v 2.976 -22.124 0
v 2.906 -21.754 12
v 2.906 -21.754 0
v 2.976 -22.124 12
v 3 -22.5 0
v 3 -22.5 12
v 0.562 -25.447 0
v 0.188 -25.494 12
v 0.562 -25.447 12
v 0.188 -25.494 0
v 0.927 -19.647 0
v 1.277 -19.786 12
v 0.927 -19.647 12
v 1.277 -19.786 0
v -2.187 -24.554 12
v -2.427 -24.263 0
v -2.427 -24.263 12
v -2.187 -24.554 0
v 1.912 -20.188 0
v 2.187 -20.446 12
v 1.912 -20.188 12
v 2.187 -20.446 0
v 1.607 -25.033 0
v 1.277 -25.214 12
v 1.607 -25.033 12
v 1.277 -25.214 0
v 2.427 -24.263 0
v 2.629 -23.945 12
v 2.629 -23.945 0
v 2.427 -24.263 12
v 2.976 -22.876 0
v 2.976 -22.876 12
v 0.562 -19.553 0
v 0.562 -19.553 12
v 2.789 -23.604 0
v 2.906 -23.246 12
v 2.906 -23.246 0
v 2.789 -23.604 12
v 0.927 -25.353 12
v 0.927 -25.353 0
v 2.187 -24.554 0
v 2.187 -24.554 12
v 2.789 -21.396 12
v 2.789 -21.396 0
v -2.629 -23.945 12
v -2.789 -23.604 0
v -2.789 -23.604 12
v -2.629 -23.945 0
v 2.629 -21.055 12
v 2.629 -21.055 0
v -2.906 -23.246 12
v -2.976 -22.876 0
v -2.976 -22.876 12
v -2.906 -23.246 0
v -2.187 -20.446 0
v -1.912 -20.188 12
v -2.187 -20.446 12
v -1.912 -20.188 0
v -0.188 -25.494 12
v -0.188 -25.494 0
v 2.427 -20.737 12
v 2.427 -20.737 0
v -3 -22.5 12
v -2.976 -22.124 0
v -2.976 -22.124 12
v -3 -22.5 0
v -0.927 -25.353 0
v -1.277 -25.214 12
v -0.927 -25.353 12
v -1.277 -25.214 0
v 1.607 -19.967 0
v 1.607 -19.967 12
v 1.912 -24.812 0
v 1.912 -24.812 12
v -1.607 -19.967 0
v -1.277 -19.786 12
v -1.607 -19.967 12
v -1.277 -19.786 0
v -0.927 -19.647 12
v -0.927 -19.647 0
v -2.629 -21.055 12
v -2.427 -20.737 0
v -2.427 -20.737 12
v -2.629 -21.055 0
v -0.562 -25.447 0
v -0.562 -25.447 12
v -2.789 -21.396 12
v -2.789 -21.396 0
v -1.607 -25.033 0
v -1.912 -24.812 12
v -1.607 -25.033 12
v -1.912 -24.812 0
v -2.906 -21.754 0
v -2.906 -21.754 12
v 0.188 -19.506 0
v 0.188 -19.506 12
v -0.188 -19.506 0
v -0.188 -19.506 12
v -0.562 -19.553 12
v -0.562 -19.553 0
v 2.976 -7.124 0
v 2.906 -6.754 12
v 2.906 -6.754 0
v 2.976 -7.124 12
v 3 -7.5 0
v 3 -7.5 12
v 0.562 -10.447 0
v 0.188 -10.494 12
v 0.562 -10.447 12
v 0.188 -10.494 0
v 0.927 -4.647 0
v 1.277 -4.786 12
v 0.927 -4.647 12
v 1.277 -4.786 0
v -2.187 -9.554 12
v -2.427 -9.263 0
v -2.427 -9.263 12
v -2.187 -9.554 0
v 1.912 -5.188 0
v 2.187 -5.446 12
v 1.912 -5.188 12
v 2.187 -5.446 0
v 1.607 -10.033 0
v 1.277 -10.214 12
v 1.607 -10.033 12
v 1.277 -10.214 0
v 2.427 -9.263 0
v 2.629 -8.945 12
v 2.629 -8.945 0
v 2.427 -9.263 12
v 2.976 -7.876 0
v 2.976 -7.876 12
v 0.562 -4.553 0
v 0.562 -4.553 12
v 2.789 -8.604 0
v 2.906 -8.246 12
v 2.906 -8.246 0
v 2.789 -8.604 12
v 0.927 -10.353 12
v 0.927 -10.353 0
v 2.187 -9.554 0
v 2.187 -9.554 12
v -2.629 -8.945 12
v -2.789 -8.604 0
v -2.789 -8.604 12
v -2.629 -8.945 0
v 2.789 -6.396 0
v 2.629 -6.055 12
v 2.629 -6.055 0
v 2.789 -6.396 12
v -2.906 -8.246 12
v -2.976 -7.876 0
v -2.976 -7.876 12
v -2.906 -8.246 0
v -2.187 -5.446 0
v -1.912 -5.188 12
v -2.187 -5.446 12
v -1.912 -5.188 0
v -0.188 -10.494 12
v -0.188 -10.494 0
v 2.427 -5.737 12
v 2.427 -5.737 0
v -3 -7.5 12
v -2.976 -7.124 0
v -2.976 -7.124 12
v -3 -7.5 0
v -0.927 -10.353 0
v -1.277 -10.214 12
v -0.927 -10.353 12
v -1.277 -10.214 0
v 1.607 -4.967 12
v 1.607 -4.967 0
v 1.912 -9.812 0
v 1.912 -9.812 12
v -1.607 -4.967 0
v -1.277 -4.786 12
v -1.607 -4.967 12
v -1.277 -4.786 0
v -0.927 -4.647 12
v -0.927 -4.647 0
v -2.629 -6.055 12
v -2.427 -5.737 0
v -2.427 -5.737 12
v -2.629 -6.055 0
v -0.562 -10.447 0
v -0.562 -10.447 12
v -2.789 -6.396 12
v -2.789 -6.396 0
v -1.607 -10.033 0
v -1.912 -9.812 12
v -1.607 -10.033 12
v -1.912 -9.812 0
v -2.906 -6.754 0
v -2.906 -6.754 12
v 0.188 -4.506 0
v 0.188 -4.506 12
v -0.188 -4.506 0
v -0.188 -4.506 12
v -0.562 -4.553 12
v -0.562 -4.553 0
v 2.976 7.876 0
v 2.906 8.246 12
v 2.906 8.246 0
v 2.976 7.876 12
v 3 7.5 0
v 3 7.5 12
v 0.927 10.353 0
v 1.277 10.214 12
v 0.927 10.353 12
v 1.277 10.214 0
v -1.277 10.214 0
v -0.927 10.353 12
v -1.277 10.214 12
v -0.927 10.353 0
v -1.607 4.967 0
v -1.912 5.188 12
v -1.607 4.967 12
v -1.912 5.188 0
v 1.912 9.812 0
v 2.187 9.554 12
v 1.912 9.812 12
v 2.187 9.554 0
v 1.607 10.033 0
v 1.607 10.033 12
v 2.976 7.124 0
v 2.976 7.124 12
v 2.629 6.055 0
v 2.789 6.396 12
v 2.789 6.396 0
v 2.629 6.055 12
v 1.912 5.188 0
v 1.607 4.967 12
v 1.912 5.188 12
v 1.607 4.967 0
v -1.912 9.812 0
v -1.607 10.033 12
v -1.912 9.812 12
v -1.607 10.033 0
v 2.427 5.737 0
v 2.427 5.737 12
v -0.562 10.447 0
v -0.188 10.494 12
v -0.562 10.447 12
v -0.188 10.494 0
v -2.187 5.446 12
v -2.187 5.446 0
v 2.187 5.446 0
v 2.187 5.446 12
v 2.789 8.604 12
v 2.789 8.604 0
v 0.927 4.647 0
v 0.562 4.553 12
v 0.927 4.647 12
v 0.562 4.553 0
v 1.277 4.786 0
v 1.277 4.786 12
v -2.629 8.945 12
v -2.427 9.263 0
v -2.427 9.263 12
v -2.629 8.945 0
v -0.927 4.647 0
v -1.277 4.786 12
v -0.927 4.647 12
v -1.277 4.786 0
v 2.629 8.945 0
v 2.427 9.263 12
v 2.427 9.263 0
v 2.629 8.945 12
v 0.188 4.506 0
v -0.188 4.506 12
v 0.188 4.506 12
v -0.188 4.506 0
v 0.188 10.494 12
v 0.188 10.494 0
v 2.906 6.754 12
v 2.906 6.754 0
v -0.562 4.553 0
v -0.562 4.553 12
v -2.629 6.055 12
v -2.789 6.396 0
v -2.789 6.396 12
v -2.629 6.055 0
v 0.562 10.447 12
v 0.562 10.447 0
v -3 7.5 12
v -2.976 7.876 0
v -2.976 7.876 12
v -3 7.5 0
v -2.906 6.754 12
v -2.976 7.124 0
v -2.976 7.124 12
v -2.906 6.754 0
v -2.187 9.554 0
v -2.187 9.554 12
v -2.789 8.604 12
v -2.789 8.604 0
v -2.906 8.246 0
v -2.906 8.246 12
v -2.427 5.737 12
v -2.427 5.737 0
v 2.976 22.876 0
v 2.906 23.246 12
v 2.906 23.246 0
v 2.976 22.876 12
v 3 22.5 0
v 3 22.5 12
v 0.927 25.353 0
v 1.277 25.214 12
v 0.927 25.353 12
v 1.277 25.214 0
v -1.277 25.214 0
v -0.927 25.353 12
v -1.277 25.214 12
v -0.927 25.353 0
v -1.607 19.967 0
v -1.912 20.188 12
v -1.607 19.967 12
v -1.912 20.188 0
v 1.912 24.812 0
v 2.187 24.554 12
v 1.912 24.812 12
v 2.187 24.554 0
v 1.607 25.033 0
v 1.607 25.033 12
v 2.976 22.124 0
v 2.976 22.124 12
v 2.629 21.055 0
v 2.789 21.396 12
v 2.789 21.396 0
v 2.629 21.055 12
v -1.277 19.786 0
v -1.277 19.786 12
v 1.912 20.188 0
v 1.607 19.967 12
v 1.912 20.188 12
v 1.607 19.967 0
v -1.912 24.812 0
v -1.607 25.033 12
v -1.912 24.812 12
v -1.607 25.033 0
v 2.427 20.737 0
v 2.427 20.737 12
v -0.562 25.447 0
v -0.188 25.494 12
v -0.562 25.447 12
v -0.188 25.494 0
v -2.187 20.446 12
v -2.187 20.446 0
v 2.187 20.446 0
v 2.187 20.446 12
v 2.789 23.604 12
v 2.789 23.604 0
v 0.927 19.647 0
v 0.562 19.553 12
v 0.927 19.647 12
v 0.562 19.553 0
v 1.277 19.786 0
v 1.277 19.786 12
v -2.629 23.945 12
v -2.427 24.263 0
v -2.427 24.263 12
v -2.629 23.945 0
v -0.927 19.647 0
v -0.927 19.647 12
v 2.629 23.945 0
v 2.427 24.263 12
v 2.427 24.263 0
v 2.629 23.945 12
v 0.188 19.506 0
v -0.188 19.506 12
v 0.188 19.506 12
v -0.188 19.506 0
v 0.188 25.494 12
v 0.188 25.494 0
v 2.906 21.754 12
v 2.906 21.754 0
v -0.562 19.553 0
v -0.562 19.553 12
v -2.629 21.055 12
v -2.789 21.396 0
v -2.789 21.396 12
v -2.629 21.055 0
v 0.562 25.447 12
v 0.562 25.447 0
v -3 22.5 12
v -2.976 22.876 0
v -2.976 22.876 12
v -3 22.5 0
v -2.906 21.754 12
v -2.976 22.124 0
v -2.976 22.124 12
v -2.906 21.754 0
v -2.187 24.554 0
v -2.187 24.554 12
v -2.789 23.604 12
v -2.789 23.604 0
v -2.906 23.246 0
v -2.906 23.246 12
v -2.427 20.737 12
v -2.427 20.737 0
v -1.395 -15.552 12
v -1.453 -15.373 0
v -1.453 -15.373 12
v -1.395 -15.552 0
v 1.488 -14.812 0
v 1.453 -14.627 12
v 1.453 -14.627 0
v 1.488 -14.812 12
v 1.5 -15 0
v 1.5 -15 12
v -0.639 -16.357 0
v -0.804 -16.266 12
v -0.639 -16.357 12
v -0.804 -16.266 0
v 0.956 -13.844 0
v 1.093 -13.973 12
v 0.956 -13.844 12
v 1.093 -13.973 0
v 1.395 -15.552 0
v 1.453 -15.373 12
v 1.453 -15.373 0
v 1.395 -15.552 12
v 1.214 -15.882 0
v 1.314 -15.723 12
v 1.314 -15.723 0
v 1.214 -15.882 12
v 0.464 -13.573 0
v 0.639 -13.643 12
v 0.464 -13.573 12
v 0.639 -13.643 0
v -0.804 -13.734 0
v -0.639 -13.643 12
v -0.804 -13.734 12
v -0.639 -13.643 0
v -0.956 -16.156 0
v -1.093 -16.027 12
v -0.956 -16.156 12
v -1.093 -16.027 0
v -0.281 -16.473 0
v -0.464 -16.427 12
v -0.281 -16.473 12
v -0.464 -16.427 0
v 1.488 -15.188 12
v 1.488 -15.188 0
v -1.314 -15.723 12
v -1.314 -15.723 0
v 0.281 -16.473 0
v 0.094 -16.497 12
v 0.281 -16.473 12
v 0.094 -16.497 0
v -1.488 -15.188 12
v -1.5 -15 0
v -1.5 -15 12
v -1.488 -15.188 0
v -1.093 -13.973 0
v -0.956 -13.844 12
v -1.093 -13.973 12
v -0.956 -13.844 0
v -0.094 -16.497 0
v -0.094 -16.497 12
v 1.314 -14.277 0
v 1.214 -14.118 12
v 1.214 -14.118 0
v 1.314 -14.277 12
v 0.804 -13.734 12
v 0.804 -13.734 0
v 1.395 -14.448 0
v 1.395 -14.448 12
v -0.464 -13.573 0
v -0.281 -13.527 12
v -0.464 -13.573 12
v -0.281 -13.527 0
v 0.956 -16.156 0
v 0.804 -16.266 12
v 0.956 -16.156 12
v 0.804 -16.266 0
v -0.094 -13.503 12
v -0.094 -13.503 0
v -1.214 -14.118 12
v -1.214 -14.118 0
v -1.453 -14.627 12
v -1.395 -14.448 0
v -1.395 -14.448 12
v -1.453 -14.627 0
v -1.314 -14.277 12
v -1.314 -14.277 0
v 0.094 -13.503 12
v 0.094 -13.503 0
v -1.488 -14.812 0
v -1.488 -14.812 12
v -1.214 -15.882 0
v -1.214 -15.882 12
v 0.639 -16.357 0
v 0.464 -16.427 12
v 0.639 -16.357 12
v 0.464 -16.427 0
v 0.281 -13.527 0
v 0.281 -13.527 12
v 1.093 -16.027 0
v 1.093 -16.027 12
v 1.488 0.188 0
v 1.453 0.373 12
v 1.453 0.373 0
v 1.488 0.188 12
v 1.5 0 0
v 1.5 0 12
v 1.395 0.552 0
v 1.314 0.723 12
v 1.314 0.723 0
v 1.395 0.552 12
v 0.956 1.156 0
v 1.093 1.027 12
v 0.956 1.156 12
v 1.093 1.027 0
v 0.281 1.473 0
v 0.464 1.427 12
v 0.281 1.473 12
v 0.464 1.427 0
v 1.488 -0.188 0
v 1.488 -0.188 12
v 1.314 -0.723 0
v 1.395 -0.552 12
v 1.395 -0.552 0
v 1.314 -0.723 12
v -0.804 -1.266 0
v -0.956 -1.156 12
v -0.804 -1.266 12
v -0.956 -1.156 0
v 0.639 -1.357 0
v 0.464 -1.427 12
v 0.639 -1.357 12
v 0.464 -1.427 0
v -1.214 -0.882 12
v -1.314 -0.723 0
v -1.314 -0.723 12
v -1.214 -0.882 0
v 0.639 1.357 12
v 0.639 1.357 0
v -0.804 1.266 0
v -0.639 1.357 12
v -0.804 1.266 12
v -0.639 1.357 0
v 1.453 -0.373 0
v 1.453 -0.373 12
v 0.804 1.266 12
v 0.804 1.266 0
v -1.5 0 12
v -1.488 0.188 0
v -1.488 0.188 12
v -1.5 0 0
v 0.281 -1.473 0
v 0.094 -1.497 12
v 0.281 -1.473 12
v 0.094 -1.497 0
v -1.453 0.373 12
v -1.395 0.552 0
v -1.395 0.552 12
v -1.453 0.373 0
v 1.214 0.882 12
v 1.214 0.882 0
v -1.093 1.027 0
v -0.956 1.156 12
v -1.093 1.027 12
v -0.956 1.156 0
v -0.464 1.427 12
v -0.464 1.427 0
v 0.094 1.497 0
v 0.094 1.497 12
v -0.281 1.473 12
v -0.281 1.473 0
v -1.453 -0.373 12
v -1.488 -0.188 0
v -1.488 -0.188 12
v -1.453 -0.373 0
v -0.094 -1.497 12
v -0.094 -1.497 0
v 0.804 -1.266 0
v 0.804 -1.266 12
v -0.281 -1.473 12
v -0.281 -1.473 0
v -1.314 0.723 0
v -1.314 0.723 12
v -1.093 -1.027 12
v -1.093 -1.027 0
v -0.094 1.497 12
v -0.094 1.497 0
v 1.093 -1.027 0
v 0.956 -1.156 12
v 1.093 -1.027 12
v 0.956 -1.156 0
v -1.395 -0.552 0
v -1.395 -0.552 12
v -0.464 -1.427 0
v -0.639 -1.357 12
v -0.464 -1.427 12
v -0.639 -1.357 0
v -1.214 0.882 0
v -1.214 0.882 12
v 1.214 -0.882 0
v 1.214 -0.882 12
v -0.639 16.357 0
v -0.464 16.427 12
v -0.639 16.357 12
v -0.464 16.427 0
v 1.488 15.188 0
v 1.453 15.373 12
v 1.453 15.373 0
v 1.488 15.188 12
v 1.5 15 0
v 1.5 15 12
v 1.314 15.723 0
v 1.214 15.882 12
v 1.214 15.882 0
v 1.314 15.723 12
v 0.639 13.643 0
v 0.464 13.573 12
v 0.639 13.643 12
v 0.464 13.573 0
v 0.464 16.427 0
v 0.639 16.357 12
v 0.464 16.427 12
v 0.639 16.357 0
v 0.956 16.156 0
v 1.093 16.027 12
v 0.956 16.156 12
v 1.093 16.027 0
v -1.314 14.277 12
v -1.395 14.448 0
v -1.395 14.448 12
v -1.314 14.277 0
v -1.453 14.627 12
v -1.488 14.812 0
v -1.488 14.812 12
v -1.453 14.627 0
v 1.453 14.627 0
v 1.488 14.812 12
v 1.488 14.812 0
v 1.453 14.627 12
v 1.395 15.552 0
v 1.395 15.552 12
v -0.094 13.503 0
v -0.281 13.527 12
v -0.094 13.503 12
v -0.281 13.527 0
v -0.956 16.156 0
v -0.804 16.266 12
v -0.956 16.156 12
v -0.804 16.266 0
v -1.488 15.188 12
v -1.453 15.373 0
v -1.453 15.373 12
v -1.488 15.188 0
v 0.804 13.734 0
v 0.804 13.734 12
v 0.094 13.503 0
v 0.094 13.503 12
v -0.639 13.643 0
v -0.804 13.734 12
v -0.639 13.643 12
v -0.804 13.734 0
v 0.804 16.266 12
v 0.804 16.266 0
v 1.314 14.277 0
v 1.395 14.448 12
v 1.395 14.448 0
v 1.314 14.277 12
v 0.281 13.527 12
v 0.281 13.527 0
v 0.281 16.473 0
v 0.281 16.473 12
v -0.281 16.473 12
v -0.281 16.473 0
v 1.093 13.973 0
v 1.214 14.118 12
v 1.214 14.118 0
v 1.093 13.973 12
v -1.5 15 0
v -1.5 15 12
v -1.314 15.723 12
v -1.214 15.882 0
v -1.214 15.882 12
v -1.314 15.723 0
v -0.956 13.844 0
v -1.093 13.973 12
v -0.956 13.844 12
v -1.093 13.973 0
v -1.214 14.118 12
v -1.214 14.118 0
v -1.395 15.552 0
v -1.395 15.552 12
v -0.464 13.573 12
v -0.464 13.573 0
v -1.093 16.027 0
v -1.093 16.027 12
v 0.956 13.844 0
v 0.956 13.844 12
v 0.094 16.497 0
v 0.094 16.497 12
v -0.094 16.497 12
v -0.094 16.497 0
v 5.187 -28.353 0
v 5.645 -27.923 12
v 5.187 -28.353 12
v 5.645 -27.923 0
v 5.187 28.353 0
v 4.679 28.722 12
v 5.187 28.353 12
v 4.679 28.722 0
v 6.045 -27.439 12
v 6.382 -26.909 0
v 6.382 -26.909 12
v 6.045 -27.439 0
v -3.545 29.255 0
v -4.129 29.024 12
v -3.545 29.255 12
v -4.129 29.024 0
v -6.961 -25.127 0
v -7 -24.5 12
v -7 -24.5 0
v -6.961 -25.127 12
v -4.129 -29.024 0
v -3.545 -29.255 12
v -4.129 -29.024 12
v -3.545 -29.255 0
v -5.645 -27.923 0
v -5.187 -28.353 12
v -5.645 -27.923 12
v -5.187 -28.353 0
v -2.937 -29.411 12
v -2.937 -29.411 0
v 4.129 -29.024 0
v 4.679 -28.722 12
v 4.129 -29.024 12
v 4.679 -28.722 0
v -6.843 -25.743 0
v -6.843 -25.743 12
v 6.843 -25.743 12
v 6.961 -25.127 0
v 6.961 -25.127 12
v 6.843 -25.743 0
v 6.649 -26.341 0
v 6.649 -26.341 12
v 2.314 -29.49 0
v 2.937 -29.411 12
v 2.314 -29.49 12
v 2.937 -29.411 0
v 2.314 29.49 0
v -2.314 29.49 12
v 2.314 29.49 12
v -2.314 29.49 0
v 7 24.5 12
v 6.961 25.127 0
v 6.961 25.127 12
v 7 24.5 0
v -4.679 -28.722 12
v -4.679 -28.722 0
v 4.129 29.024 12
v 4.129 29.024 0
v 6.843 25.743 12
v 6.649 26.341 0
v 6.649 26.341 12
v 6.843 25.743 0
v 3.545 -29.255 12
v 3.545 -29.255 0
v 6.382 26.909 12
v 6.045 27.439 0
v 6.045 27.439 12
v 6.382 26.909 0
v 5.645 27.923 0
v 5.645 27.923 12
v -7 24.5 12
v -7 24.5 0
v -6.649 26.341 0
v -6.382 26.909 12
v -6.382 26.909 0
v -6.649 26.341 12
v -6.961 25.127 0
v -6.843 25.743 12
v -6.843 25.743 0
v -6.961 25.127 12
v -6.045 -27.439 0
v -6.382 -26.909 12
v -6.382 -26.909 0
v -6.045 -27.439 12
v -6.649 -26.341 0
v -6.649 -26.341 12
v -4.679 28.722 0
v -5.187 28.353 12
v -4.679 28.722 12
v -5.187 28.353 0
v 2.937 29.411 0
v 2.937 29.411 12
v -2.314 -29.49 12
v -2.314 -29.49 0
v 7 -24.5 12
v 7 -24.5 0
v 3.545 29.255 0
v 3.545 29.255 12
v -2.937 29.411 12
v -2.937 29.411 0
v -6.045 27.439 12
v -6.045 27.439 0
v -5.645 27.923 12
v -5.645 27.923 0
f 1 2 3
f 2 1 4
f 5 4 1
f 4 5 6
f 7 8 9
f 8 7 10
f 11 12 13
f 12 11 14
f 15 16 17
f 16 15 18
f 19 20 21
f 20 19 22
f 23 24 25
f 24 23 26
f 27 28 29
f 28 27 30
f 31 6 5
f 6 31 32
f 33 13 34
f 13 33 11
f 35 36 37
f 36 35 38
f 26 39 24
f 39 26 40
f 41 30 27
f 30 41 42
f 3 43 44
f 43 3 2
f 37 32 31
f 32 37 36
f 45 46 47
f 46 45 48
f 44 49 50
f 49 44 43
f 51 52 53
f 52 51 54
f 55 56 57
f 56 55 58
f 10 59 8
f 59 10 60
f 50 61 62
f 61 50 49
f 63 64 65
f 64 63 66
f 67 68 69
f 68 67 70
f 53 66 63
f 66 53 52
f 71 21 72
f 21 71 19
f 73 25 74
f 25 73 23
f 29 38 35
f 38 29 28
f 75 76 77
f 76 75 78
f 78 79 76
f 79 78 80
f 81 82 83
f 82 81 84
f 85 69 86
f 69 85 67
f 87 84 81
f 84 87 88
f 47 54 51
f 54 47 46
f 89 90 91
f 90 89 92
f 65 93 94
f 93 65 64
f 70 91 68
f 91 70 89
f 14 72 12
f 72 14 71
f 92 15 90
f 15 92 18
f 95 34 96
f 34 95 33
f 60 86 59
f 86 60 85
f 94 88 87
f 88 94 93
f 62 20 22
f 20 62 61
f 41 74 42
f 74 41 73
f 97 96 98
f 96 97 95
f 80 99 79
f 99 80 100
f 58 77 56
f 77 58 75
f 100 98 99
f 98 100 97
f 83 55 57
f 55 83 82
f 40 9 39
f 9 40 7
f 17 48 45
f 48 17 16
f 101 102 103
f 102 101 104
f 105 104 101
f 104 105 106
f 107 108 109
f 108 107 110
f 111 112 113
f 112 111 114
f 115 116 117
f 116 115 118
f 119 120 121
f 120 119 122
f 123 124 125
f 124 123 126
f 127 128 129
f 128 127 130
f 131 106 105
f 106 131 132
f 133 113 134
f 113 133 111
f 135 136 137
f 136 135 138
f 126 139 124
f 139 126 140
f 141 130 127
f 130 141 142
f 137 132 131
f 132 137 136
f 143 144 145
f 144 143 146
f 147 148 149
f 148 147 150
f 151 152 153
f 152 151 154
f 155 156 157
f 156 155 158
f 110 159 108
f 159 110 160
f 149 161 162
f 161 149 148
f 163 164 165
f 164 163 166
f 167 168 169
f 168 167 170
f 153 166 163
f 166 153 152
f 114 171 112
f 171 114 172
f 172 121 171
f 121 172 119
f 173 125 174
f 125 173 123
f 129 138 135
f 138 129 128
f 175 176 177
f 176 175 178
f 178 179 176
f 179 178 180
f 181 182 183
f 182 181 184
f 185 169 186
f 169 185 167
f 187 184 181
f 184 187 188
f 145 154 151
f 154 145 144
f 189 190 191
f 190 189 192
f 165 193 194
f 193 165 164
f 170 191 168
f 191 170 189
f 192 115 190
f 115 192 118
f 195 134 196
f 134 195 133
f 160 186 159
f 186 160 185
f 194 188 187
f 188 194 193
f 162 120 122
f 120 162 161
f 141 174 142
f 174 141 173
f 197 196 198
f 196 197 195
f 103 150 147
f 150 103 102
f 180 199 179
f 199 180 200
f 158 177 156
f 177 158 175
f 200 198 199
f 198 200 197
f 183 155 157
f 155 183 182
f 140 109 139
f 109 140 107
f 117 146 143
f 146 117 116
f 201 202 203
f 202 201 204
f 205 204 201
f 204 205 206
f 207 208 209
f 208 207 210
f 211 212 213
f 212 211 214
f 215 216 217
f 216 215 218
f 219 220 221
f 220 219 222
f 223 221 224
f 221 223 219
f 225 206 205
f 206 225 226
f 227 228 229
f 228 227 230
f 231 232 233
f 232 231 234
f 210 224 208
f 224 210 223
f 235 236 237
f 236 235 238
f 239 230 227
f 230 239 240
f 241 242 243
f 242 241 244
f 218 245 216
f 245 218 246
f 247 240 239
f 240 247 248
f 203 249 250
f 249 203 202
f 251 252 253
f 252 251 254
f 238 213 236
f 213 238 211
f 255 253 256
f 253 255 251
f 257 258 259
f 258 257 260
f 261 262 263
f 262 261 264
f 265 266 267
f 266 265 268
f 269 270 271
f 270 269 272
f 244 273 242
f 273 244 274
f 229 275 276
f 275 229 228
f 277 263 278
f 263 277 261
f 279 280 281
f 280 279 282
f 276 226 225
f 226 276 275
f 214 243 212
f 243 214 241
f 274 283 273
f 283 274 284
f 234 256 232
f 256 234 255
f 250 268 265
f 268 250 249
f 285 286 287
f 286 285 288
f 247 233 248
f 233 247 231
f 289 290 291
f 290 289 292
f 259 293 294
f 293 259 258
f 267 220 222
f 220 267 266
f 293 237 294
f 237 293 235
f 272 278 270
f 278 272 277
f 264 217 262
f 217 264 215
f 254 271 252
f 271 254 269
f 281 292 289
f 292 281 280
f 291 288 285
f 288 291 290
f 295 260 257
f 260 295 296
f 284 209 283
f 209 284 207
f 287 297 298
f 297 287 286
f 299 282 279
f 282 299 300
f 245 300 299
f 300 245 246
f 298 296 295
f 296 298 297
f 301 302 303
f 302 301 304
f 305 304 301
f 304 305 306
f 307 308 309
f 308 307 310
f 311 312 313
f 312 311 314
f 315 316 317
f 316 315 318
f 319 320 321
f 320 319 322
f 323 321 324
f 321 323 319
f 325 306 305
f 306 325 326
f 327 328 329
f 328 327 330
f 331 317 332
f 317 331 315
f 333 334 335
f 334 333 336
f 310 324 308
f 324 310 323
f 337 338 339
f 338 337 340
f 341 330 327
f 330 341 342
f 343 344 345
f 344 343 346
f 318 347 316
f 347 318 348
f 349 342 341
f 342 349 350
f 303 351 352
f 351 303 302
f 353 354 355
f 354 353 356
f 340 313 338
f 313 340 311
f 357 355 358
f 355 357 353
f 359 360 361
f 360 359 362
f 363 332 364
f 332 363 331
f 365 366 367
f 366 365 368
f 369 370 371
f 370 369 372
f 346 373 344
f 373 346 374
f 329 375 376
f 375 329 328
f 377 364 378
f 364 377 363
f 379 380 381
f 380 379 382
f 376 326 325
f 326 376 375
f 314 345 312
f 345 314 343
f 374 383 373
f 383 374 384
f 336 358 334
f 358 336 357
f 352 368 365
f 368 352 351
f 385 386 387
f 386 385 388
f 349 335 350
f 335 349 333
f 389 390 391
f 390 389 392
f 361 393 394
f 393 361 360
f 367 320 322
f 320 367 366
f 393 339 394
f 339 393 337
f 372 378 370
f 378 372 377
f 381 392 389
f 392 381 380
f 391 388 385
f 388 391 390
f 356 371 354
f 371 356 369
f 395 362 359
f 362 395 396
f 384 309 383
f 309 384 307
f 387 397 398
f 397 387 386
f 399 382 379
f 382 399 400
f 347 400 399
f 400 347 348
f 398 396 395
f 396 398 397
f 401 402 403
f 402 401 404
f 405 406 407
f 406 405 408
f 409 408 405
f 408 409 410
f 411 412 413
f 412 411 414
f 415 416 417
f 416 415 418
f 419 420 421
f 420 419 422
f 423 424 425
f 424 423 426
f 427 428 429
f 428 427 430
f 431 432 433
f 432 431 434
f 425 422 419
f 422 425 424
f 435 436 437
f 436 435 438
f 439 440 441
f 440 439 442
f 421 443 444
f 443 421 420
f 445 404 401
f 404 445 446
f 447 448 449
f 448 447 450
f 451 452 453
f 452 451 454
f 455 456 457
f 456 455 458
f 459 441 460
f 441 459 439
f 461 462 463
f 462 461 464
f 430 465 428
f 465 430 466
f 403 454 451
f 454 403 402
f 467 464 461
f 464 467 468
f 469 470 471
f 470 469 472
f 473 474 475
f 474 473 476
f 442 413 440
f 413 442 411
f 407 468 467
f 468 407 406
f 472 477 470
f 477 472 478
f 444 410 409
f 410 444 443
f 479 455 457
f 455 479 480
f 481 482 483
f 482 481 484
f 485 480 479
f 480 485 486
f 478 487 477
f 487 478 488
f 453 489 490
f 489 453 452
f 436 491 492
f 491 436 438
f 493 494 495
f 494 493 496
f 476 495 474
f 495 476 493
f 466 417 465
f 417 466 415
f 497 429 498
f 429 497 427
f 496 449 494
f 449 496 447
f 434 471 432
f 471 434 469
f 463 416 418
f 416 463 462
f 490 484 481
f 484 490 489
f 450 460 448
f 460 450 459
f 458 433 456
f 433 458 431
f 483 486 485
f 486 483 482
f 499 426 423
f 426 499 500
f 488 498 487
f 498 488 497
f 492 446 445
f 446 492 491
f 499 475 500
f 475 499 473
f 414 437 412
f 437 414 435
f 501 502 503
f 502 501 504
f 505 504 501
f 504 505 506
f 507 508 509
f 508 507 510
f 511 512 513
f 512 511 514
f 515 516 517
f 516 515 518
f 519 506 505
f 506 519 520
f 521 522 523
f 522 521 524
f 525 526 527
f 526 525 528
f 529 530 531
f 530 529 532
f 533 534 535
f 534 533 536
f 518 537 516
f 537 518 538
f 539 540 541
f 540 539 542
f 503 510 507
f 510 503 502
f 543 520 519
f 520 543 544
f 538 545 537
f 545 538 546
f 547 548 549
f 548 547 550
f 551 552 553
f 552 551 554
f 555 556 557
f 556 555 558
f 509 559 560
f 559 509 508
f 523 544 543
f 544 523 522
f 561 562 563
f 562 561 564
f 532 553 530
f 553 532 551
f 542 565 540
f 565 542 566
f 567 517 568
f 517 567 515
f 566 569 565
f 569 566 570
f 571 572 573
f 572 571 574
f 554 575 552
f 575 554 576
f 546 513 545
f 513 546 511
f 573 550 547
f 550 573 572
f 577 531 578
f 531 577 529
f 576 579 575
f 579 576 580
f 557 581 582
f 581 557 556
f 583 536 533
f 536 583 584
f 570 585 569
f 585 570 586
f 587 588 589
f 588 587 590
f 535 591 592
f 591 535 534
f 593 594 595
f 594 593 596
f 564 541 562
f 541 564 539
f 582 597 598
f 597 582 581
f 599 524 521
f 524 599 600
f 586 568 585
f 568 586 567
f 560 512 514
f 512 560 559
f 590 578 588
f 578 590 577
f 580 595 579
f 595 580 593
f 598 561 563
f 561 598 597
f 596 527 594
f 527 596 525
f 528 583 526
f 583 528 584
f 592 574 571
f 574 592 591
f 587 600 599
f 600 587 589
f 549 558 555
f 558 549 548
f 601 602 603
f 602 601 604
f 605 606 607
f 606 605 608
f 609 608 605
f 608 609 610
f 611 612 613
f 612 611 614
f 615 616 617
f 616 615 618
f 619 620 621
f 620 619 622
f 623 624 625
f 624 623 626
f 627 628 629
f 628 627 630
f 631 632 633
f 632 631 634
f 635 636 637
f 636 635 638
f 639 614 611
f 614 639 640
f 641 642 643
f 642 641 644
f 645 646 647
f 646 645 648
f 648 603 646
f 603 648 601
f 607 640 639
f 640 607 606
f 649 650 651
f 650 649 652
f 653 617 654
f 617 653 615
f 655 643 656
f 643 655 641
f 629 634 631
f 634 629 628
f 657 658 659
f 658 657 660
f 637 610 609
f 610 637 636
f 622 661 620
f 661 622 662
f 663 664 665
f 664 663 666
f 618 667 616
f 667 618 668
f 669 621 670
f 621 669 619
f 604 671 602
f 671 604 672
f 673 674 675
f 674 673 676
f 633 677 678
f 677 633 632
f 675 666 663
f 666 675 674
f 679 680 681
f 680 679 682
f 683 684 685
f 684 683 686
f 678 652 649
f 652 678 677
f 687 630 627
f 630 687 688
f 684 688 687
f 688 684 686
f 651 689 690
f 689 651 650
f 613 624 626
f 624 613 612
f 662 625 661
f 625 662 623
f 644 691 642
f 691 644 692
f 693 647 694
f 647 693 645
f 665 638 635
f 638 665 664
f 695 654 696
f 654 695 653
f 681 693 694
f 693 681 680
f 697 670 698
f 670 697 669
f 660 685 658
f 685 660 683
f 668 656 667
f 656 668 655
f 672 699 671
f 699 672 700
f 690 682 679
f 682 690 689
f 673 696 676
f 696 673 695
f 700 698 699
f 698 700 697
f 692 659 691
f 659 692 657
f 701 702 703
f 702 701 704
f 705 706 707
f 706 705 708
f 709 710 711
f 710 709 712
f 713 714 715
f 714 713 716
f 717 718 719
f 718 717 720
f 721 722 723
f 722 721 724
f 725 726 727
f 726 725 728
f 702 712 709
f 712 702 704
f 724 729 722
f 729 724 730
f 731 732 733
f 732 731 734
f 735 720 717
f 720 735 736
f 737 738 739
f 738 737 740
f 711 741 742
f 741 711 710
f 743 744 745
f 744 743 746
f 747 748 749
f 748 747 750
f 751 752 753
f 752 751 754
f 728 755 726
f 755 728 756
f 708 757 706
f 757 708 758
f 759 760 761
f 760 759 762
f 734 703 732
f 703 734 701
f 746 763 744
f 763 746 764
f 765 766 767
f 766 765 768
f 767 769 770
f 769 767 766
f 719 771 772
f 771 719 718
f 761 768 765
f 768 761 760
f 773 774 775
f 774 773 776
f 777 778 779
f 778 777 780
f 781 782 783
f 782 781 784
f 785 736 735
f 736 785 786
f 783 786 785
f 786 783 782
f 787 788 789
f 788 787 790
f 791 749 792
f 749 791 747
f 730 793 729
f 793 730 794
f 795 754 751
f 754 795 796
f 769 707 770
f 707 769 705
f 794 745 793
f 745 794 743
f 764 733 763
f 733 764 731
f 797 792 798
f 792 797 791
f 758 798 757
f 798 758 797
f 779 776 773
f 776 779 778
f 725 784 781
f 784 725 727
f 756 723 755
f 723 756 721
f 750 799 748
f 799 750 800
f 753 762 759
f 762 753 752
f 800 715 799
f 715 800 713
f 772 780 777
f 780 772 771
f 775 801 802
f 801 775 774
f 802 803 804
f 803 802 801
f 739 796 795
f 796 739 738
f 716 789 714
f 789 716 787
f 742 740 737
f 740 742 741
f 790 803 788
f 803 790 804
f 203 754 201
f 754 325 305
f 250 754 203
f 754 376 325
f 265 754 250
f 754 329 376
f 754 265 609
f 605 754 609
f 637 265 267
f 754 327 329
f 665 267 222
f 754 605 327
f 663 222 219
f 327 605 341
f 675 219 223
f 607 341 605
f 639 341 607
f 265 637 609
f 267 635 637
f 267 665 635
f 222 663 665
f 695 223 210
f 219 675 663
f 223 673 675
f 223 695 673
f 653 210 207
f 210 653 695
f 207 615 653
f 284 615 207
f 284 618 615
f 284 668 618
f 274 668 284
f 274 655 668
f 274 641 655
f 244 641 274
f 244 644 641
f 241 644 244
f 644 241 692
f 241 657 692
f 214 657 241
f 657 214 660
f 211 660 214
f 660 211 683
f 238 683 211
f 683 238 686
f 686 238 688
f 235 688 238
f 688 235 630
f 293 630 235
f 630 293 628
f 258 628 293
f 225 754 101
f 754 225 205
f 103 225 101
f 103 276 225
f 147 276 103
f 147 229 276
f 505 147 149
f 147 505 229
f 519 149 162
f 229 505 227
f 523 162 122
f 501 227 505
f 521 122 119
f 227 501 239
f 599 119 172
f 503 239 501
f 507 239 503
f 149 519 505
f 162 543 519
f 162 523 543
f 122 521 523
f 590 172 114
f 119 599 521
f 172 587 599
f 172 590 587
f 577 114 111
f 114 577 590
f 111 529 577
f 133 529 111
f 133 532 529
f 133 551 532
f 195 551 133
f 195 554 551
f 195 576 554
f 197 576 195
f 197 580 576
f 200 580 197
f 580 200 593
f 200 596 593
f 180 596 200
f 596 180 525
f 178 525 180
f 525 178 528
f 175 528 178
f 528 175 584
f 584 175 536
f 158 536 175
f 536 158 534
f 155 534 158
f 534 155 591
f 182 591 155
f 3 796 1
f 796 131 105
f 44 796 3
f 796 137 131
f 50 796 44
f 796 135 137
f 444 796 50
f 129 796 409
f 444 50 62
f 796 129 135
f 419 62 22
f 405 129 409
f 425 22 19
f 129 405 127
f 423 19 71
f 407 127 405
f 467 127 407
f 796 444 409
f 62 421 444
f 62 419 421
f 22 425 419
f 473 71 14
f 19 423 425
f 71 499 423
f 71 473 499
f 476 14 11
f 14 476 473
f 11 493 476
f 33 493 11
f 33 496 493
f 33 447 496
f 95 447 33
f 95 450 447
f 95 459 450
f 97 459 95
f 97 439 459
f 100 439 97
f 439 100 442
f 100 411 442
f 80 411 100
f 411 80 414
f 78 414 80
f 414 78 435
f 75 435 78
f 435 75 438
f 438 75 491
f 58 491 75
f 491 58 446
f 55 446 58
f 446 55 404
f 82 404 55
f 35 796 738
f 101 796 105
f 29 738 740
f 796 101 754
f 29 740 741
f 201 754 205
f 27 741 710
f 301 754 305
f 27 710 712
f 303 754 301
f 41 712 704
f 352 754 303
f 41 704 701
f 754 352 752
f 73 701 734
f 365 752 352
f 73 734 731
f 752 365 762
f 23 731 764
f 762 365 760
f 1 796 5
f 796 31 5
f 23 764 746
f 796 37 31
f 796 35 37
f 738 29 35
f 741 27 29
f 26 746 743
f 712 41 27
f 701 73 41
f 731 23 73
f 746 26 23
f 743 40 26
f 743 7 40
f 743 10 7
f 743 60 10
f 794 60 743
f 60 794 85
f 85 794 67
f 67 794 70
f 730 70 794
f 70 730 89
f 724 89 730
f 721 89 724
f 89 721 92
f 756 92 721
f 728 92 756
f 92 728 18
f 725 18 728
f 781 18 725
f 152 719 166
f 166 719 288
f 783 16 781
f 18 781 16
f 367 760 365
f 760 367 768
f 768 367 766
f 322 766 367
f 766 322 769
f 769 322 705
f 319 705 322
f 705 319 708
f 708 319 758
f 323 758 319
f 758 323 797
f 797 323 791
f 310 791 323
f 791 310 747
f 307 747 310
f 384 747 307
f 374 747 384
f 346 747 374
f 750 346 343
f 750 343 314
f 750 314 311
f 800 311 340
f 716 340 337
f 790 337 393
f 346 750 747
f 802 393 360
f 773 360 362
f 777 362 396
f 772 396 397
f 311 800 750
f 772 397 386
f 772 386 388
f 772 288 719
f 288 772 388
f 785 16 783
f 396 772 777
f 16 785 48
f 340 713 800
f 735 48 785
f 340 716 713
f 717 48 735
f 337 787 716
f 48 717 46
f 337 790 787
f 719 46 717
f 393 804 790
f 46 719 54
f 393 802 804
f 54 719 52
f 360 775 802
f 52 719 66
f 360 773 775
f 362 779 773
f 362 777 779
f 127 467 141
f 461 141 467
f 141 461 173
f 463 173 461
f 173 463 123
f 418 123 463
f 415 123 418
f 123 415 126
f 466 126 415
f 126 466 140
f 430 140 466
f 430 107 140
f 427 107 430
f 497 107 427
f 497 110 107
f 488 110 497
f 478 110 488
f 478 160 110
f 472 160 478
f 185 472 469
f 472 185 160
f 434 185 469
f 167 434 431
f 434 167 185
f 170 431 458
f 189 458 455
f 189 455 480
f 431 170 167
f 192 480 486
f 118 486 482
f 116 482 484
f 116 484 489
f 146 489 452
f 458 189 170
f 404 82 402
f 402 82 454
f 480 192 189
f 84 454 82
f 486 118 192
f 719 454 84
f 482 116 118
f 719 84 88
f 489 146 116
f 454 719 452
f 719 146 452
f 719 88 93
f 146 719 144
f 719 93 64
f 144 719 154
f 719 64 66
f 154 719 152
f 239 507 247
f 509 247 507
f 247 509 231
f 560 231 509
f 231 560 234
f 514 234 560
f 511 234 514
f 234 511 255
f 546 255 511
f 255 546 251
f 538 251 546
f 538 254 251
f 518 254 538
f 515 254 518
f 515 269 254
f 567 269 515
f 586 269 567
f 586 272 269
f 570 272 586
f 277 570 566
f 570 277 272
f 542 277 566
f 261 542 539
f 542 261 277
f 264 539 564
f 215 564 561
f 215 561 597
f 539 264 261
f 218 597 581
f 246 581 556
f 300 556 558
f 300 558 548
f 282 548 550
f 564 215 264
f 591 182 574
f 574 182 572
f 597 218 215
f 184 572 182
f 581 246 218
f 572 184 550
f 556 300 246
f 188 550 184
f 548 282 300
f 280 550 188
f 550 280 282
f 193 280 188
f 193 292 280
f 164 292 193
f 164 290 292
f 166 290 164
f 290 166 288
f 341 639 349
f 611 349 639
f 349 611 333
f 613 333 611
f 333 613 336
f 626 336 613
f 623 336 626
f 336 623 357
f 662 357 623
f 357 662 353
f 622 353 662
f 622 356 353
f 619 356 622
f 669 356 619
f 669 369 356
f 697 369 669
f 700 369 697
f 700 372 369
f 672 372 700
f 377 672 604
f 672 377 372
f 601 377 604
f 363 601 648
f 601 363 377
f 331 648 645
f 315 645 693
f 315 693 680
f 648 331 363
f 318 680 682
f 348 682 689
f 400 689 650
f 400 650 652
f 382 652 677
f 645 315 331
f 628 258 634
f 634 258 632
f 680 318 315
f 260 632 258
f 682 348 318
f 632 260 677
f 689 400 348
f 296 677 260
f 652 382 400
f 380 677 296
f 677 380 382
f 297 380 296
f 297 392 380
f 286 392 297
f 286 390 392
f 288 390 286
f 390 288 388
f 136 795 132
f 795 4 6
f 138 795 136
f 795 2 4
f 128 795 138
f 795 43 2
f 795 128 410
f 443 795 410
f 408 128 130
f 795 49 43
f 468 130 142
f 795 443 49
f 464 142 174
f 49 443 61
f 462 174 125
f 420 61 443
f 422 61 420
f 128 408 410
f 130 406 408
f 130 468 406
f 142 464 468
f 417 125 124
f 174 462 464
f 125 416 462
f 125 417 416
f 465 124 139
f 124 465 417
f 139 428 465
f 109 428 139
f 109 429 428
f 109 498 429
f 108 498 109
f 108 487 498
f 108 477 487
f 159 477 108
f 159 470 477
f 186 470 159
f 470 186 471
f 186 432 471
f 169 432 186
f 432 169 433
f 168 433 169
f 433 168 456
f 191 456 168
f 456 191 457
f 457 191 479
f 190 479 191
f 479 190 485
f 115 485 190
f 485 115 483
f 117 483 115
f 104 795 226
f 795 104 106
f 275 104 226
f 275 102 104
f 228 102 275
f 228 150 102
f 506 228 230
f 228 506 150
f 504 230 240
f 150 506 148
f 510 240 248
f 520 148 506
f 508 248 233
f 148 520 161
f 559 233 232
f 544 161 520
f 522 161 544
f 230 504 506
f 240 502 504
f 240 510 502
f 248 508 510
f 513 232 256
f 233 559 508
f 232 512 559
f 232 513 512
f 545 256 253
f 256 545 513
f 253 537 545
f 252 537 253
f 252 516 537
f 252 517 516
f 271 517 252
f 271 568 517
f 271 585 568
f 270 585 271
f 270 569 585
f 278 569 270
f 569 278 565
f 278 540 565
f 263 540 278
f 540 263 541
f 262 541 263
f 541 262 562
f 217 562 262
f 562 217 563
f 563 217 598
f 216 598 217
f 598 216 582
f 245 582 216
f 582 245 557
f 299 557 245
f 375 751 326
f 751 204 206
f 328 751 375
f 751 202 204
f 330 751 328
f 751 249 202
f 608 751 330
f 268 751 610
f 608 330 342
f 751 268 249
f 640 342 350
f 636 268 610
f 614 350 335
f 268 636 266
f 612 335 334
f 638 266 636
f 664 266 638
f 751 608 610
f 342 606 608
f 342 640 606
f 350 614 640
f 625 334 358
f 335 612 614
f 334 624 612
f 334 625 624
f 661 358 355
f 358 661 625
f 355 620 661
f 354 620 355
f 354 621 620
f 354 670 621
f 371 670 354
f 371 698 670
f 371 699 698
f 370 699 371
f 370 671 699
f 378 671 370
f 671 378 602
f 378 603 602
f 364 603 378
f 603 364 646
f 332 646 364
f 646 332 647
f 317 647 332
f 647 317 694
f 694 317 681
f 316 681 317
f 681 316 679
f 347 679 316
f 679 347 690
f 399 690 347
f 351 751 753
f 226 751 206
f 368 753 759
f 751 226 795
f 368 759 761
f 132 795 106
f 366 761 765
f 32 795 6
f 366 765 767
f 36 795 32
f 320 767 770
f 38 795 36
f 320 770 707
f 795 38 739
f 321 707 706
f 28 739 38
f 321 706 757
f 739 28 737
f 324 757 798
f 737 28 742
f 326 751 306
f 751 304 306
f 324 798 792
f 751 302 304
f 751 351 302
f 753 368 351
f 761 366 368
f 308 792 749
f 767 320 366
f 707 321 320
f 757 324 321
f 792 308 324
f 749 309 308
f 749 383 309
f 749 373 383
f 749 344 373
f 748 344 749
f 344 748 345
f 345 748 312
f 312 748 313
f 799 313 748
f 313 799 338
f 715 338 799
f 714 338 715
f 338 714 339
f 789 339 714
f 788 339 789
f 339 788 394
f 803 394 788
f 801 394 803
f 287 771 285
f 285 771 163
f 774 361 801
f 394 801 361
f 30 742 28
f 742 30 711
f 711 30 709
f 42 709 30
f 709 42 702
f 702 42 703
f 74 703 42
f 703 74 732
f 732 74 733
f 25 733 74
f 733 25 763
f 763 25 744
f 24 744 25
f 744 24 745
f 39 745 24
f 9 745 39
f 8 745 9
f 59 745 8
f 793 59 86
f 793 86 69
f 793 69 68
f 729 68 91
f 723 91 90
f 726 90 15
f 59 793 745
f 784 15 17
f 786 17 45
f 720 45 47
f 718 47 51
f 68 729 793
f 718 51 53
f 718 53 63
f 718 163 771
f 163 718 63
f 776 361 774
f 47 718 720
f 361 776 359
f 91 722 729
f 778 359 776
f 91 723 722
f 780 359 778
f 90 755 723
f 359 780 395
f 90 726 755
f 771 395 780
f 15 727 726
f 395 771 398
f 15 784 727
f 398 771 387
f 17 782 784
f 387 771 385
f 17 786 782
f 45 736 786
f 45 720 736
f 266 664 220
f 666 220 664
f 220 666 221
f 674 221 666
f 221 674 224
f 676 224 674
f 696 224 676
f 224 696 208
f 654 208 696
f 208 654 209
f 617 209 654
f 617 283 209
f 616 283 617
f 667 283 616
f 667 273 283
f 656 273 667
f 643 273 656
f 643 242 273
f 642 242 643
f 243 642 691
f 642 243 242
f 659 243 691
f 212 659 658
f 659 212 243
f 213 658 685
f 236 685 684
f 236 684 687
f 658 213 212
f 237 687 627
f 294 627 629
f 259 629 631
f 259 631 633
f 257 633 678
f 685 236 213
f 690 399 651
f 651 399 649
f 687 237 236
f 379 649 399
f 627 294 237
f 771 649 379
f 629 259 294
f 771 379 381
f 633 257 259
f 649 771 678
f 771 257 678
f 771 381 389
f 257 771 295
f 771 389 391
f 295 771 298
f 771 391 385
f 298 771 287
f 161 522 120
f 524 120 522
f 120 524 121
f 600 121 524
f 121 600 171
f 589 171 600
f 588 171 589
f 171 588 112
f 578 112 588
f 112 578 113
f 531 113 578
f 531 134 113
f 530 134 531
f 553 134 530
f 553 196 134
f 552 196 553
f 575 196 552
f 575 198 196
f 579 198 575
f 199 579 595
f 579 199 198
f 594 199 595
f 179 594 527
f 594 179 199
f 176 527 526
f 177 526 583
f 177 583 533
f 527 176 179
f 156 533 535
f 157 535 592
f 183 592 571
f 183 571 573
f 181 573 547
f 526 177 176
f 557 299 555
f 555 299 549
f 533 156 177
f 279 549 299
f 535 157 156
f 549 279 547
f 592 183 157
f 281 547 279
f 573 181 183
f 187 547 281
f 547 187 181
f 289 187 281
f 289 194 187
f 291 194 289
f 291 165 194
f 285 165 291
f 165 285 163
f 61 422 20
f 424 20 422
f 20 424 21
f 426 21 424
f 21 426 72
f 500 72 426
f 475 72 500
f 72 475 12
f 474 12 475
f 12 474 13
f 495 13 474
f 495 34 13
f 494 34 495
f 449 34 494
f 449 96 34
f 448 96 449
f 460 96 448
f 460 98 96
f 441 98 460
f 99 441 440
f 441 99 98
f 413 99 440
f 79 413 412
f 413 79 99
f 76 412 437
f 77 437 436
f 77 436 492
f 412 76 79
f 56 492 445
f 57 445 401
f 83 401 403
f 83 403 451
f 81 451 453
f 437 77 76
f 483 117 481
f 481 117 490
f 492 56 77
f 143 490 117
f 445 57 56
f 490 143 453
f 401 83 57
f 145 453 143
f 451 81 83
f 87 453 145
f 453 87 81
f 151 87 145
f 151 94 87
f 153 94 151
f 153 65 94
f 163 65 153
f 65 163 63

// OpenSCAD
$fn = 50;

difference() {
	union() {
		hull() {
			translate(v = [-2.0, 24.5, 0]) {
				cylinder(h = 12, r = 5);
			}
			translate(v = [2.0, 24.5, 0]) {
				cylinder(h = 12, r = 5);
			}
			translate(v = [-2.0, -24.5, 0]) {
				cylinder(h = 12, r = 5);
			}
			translate(v = [2.0, -24.5, 0]) {
				cylinder(h = 12, r = 5);
			}
		}
	}
	union() {
		translate(v = [0.0, -22.5, 0]) {
			translate(v = [0, 0, -100]) {
				cylinder(h = 200, r = 3.0);
			}
		}
		translate(v = [0.0, -7.5, 0]) {
			translate(v = [0, 0, -100]) {
				cylinder(h = 200, r = 3.0);
			}
		}
		translate(v = [0.0, 7.5, 0]) {
			translate(v = [0, 0, -100]) {
				cylinder(h = 200, r = 3.0);
			}
		}
		translate(v = [0.0, 22.5, 0]) {
			translate(v = [0, 0, -100]) {
				cylinder(h = 200, r = 3.0);
			}
		}
		translate(v = [0.0, -22.5, 0]) {
			translate(v = [0, 0, -100]) {
				cylinder(h = 200, r = 1.5);
			}
		}
		translate(v = [0.0, -15.0, 0]) {
			translate(v = [0, 0, -100]) {
				cylinder(h = 200, r = 1.5);
			}
		}
		translate(v = [0.0, -7.5, 0]) {
			translate(v = [0, 0, -100]) {
				cylinder(h = 200, r = 1.5);
			}
		}
		translate(v = [0, 0, -100]) {
			cylinder(h = 200, r = 1.5);
		}
		translate(v = [0.0, 7.5, 0]) {
			translate(v = [0, 0, -100]) {
				cylinder(h = 200, r = 1.5);
			}
		}
		translate(v = [0.0, 15.0, 0]) {
			translate(v = [0, 0, -100]) {
				cylinder(h = 200, r = 1.5);
			}
		}
		translate(v = [0.0, 22.5, 0]) {
			translate(v = [0, 0, -100]) {
				cylinder(h = 200, r = 1.5);
			}
		}
	}
}
